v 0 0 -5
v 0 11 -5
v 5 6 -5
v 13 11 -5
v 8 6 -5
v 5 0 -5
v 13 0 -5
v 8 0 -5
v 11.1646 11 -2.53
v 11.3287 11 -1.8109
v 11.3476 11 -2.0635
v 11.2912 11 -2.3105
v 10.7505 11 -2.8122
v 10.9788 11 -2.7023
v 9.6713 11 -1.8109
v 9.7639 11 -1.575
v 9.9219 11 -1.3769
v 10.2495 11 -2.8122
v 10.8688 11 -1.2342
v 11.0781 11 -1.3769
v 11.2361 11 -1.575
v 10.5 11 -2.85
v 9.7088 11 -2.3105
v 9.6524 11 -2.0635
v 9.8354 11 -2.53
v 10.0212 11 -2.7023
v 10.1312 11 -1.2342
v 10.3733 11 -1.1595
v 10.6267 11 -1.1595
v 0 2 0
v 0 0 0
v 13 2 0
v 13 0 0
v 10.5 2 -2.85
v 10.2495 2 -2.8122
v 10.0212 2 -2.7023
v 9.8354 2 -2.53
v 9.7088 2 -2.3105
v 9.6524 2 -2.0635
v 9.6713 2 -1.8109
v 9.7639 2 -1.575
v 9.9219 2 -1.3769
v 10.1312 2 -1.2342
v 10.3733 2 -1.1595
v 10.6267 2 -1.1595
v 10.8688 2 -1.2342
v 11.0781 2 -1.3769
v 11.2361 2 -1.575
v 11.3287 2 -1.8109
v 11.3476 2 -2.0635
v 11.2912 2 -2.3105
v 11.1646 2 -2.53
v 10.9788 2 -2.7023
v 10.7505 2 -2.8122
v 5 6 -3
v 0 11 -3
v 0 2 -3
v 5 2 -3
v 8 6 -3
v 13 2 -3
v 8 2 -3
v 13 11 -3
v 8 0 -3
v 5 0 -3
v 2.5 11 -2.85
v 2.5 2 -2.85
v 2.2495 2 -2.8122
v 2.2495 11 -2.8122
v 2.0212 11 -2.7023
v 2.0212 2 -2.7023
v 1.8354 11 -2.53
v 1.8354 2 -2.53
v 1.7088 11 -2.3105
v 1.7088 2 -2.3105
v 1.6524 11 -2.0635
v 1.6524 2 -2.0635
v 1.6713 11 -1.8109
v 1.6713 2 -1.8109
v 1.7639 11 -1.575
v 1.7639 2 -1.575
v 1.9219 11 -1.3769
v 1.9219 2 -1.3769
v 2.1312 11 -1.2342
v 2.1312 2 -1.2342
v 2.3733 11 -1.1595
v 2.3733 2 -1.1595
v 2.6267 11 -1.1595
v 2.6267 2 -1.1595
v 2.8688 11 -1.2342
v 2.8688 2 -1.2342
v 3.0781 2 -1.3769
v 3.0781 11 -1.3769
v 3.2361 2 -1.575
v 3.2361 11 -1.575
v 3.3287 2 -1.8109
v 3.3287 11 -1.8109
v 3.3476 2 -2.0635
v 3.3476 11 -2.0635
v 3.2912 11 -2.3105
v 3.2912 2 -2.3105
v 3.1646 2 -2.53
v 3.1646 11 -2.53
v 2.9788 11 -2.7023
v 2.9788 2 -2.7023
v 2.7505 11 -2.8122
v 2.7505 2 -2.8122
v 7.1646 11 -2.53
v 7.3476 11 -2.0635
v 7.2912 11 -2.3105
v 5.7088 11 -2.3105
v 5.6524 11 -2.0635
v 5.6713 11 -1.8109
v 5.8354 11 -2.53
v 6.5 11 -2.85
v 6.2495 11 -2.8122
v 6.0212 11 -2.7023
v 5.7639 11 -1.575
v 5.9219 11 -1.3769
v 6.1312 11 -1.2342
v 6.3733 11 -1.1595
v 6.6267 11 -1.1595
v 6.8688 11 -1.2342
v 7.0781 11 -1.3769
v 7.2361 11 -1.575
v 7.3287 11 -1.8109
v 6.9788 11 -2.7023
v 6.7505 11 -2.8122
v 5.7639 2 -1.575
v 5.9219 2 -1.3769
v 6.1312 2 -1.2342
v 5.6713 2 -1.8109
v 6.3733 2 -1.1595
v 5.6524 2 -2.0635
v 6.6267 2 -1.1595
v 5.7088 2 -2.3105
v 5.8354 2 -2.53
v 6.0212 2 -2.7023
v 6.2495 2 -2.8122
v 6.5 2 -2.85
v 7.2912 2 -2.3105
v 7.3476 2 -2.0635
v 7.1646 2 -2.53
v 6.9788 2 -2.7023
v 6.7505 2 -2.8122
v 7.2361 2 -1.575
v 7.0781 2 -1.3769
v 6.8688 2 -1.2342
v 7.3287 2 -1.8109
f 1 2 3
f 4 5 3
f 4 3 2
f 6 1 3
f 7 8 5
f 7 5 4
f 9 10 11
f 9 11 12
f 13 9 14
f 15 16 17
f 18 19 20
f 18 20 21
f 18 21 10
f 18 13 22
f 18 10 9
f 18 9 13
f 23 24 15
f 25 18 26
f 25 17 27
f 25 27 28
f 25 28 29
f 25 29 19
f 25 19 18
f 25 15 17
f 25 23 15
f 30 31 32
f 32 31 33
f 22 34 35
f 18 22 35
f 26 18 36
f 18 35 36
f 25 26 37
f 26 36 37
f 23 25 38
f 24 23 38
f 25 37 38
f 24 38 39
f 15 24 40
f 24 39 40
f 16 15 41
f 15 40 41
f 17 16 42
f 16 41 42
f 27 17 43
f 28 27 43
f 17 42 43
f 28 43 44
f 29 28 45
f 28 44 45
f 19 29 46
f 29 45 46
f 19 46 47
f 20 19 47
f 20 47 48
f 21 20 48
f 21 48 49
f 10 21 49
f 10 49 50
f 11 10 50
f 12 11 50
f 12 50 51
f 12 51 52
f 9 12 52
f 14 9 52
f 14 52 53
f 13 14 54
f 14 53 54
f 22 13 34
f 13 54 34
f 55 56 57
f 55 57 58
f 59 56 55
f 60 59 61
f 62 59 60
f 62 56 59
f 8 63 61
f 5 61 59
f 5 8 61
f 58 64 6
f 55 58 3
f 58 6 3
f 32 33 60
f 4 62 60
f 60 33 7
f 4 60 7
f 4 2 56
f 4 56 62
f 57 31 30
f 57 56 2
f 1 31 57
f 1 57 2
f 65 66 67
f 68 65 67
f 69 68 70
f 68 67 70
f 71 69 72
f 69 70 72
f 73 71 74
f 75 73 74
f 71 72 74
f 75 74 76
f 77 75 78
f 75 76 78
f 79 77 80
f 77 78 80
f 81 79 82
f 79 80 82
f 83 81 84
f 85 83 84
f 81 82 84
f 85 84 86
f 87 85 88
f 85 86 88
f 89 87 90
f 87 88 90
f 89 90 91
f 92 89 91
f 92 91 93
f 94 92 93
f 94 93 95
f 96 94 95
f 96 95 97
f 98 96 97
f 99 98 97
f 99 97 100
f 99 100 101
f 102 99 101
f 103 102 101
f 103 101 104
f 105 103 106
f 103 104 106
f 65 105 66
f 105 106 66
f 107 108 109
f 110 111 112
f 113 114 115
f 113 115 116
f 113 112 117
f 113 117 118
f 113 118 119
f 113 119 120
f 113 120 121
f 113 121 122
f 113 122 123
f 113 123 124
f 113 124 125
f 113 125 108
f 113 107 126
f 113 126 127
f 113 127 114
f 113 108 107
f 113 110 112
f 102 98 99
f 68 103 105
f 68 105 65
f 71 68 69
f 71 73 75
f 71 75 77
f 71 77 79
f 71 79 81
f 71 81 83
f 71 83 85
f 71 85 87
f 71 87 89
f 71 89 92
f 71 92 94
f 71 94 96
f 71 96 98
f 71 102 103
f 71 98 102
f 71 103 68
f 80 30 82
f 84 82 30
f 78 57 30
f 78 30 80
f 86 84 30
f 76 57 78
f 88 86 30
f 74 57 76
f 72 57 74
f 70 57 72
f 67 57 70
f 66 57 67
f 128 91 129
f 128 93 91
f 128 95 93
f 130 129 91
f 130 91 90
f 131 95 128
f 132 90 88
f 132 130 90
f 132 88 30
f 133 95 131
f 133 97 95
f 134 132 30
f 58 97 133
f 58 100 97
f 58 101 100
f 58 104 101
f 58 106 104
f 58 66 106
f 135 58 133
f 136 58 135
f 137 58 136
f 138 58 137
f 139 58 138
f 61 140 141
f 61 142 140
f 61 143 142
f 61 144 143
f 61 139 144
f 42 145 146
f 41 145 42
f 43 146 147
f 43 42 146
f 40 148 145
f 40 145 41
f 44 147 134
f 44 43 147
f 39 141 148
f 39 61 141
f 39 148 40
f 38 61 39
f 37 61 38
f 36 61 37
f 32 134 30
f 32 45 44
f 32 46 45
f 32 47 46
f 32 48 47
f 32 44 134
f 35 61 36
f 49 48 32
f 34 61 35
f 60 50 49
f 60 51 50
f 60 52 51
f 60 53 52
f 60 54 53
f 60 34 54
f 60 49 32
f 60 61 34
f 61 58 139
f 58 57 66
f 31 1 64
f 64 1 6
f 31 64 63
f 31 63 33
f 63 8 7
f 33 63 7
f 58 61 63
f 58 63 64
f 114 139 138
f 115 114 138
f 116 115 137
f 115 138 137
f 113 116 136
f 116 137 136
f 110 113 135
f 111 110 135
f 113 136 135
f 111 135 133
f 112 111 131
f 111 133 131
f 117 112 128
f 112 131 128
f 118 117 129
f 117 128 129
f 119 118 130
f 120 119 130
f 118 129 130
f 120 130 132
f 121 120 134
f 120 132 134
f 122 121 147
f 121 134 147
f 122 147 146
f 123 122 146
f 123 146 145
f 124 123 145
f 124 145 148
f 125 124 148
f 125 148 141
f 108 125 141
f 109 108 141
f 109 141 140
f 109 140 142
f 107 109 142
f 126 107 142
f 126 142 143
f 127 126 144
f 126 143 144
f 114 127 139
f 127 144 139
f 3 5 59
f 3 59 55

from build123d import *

# Parameters (mm, degrees)
SKETCH1_W           = 13
SKETCH1_H           = 5
BOSS_EXTRUDE1_DEPTH = 11
SKETCH2_W           = 13
SKETCH2_H           = 3
CUT_EXTRUDE1_DEPTH  = 9
SKETCH3_W           = 3
SKETCH3_H           = 6
CUT_EXTRUDE2_DEPTH  = 2
SKETCH4_R           = 0.85
BOSS_EXTRUDE3_DEPTH = 9


with BuildPart() as part:
    # Sketch1 → Boss-Extrude1 (new body)
    with BuildSketch(Plane(origin=(0, 0, 0), x_dir=(1, 0, 0), z_dir=(0, 1, 0))):
        with Locations((6.5, 2.5)):
            Rectangle(SKETCH1_W, SKETCH1_H)
    extrude(amount=BOSS_EXTRUDE1_DEPTH)

    # Sketch2 → Cut-Extrude1 (cut)
    with BuildSketch(Plane(origin=(0, 11, 0), x_dir=(1, 0, 0), z_dir=(0, 1, 0))):
        with Locations((6.5, 1.5)):
            Rectangle(SKETCH2_W, SKETCH2_H)
    extrude(amount=-CUT_EXTRUDE1_DEPTH, mode=Mode.SUBTRACT)

    # Sketch3 → Cut-Extrude2 (cut)
    with BuildSketch(Plane(origin=(0, 0, -5), x_dir=(-1, 0, 0), z_dir=(0, 0, -1))):
        with Locations((-6.5, 3)):
            Rectangle(SKETCH3_W, SKETCH3_H)
    extrude(amount=-CUT_EXTRUDE2_DEPTH, mode=Mode.SUBTRACT)

    # Sketch4 → Boss-Extrude3 (add)
    with BuildSketch(Plane(origin=(0, 2, 0), x_dir=(1, 0, 0), z_dir=(0, 1, 0))):
        with Locations(Location((10.5, 2, 0), (0, 0, 90))):
            Circle(SKETCH4_R)
        with Locations(Location((6.5, 2, 0), (0, 0, 90))):
            Circle(SKETCH4_R)
        with Locations(Location((2.5, 2, 0), (0, 0, 90))):
            Circle(SKETCH4_R)
    extrude(amount=BOSS_EXTRUDE3_DEPTH)


solid = part.part
